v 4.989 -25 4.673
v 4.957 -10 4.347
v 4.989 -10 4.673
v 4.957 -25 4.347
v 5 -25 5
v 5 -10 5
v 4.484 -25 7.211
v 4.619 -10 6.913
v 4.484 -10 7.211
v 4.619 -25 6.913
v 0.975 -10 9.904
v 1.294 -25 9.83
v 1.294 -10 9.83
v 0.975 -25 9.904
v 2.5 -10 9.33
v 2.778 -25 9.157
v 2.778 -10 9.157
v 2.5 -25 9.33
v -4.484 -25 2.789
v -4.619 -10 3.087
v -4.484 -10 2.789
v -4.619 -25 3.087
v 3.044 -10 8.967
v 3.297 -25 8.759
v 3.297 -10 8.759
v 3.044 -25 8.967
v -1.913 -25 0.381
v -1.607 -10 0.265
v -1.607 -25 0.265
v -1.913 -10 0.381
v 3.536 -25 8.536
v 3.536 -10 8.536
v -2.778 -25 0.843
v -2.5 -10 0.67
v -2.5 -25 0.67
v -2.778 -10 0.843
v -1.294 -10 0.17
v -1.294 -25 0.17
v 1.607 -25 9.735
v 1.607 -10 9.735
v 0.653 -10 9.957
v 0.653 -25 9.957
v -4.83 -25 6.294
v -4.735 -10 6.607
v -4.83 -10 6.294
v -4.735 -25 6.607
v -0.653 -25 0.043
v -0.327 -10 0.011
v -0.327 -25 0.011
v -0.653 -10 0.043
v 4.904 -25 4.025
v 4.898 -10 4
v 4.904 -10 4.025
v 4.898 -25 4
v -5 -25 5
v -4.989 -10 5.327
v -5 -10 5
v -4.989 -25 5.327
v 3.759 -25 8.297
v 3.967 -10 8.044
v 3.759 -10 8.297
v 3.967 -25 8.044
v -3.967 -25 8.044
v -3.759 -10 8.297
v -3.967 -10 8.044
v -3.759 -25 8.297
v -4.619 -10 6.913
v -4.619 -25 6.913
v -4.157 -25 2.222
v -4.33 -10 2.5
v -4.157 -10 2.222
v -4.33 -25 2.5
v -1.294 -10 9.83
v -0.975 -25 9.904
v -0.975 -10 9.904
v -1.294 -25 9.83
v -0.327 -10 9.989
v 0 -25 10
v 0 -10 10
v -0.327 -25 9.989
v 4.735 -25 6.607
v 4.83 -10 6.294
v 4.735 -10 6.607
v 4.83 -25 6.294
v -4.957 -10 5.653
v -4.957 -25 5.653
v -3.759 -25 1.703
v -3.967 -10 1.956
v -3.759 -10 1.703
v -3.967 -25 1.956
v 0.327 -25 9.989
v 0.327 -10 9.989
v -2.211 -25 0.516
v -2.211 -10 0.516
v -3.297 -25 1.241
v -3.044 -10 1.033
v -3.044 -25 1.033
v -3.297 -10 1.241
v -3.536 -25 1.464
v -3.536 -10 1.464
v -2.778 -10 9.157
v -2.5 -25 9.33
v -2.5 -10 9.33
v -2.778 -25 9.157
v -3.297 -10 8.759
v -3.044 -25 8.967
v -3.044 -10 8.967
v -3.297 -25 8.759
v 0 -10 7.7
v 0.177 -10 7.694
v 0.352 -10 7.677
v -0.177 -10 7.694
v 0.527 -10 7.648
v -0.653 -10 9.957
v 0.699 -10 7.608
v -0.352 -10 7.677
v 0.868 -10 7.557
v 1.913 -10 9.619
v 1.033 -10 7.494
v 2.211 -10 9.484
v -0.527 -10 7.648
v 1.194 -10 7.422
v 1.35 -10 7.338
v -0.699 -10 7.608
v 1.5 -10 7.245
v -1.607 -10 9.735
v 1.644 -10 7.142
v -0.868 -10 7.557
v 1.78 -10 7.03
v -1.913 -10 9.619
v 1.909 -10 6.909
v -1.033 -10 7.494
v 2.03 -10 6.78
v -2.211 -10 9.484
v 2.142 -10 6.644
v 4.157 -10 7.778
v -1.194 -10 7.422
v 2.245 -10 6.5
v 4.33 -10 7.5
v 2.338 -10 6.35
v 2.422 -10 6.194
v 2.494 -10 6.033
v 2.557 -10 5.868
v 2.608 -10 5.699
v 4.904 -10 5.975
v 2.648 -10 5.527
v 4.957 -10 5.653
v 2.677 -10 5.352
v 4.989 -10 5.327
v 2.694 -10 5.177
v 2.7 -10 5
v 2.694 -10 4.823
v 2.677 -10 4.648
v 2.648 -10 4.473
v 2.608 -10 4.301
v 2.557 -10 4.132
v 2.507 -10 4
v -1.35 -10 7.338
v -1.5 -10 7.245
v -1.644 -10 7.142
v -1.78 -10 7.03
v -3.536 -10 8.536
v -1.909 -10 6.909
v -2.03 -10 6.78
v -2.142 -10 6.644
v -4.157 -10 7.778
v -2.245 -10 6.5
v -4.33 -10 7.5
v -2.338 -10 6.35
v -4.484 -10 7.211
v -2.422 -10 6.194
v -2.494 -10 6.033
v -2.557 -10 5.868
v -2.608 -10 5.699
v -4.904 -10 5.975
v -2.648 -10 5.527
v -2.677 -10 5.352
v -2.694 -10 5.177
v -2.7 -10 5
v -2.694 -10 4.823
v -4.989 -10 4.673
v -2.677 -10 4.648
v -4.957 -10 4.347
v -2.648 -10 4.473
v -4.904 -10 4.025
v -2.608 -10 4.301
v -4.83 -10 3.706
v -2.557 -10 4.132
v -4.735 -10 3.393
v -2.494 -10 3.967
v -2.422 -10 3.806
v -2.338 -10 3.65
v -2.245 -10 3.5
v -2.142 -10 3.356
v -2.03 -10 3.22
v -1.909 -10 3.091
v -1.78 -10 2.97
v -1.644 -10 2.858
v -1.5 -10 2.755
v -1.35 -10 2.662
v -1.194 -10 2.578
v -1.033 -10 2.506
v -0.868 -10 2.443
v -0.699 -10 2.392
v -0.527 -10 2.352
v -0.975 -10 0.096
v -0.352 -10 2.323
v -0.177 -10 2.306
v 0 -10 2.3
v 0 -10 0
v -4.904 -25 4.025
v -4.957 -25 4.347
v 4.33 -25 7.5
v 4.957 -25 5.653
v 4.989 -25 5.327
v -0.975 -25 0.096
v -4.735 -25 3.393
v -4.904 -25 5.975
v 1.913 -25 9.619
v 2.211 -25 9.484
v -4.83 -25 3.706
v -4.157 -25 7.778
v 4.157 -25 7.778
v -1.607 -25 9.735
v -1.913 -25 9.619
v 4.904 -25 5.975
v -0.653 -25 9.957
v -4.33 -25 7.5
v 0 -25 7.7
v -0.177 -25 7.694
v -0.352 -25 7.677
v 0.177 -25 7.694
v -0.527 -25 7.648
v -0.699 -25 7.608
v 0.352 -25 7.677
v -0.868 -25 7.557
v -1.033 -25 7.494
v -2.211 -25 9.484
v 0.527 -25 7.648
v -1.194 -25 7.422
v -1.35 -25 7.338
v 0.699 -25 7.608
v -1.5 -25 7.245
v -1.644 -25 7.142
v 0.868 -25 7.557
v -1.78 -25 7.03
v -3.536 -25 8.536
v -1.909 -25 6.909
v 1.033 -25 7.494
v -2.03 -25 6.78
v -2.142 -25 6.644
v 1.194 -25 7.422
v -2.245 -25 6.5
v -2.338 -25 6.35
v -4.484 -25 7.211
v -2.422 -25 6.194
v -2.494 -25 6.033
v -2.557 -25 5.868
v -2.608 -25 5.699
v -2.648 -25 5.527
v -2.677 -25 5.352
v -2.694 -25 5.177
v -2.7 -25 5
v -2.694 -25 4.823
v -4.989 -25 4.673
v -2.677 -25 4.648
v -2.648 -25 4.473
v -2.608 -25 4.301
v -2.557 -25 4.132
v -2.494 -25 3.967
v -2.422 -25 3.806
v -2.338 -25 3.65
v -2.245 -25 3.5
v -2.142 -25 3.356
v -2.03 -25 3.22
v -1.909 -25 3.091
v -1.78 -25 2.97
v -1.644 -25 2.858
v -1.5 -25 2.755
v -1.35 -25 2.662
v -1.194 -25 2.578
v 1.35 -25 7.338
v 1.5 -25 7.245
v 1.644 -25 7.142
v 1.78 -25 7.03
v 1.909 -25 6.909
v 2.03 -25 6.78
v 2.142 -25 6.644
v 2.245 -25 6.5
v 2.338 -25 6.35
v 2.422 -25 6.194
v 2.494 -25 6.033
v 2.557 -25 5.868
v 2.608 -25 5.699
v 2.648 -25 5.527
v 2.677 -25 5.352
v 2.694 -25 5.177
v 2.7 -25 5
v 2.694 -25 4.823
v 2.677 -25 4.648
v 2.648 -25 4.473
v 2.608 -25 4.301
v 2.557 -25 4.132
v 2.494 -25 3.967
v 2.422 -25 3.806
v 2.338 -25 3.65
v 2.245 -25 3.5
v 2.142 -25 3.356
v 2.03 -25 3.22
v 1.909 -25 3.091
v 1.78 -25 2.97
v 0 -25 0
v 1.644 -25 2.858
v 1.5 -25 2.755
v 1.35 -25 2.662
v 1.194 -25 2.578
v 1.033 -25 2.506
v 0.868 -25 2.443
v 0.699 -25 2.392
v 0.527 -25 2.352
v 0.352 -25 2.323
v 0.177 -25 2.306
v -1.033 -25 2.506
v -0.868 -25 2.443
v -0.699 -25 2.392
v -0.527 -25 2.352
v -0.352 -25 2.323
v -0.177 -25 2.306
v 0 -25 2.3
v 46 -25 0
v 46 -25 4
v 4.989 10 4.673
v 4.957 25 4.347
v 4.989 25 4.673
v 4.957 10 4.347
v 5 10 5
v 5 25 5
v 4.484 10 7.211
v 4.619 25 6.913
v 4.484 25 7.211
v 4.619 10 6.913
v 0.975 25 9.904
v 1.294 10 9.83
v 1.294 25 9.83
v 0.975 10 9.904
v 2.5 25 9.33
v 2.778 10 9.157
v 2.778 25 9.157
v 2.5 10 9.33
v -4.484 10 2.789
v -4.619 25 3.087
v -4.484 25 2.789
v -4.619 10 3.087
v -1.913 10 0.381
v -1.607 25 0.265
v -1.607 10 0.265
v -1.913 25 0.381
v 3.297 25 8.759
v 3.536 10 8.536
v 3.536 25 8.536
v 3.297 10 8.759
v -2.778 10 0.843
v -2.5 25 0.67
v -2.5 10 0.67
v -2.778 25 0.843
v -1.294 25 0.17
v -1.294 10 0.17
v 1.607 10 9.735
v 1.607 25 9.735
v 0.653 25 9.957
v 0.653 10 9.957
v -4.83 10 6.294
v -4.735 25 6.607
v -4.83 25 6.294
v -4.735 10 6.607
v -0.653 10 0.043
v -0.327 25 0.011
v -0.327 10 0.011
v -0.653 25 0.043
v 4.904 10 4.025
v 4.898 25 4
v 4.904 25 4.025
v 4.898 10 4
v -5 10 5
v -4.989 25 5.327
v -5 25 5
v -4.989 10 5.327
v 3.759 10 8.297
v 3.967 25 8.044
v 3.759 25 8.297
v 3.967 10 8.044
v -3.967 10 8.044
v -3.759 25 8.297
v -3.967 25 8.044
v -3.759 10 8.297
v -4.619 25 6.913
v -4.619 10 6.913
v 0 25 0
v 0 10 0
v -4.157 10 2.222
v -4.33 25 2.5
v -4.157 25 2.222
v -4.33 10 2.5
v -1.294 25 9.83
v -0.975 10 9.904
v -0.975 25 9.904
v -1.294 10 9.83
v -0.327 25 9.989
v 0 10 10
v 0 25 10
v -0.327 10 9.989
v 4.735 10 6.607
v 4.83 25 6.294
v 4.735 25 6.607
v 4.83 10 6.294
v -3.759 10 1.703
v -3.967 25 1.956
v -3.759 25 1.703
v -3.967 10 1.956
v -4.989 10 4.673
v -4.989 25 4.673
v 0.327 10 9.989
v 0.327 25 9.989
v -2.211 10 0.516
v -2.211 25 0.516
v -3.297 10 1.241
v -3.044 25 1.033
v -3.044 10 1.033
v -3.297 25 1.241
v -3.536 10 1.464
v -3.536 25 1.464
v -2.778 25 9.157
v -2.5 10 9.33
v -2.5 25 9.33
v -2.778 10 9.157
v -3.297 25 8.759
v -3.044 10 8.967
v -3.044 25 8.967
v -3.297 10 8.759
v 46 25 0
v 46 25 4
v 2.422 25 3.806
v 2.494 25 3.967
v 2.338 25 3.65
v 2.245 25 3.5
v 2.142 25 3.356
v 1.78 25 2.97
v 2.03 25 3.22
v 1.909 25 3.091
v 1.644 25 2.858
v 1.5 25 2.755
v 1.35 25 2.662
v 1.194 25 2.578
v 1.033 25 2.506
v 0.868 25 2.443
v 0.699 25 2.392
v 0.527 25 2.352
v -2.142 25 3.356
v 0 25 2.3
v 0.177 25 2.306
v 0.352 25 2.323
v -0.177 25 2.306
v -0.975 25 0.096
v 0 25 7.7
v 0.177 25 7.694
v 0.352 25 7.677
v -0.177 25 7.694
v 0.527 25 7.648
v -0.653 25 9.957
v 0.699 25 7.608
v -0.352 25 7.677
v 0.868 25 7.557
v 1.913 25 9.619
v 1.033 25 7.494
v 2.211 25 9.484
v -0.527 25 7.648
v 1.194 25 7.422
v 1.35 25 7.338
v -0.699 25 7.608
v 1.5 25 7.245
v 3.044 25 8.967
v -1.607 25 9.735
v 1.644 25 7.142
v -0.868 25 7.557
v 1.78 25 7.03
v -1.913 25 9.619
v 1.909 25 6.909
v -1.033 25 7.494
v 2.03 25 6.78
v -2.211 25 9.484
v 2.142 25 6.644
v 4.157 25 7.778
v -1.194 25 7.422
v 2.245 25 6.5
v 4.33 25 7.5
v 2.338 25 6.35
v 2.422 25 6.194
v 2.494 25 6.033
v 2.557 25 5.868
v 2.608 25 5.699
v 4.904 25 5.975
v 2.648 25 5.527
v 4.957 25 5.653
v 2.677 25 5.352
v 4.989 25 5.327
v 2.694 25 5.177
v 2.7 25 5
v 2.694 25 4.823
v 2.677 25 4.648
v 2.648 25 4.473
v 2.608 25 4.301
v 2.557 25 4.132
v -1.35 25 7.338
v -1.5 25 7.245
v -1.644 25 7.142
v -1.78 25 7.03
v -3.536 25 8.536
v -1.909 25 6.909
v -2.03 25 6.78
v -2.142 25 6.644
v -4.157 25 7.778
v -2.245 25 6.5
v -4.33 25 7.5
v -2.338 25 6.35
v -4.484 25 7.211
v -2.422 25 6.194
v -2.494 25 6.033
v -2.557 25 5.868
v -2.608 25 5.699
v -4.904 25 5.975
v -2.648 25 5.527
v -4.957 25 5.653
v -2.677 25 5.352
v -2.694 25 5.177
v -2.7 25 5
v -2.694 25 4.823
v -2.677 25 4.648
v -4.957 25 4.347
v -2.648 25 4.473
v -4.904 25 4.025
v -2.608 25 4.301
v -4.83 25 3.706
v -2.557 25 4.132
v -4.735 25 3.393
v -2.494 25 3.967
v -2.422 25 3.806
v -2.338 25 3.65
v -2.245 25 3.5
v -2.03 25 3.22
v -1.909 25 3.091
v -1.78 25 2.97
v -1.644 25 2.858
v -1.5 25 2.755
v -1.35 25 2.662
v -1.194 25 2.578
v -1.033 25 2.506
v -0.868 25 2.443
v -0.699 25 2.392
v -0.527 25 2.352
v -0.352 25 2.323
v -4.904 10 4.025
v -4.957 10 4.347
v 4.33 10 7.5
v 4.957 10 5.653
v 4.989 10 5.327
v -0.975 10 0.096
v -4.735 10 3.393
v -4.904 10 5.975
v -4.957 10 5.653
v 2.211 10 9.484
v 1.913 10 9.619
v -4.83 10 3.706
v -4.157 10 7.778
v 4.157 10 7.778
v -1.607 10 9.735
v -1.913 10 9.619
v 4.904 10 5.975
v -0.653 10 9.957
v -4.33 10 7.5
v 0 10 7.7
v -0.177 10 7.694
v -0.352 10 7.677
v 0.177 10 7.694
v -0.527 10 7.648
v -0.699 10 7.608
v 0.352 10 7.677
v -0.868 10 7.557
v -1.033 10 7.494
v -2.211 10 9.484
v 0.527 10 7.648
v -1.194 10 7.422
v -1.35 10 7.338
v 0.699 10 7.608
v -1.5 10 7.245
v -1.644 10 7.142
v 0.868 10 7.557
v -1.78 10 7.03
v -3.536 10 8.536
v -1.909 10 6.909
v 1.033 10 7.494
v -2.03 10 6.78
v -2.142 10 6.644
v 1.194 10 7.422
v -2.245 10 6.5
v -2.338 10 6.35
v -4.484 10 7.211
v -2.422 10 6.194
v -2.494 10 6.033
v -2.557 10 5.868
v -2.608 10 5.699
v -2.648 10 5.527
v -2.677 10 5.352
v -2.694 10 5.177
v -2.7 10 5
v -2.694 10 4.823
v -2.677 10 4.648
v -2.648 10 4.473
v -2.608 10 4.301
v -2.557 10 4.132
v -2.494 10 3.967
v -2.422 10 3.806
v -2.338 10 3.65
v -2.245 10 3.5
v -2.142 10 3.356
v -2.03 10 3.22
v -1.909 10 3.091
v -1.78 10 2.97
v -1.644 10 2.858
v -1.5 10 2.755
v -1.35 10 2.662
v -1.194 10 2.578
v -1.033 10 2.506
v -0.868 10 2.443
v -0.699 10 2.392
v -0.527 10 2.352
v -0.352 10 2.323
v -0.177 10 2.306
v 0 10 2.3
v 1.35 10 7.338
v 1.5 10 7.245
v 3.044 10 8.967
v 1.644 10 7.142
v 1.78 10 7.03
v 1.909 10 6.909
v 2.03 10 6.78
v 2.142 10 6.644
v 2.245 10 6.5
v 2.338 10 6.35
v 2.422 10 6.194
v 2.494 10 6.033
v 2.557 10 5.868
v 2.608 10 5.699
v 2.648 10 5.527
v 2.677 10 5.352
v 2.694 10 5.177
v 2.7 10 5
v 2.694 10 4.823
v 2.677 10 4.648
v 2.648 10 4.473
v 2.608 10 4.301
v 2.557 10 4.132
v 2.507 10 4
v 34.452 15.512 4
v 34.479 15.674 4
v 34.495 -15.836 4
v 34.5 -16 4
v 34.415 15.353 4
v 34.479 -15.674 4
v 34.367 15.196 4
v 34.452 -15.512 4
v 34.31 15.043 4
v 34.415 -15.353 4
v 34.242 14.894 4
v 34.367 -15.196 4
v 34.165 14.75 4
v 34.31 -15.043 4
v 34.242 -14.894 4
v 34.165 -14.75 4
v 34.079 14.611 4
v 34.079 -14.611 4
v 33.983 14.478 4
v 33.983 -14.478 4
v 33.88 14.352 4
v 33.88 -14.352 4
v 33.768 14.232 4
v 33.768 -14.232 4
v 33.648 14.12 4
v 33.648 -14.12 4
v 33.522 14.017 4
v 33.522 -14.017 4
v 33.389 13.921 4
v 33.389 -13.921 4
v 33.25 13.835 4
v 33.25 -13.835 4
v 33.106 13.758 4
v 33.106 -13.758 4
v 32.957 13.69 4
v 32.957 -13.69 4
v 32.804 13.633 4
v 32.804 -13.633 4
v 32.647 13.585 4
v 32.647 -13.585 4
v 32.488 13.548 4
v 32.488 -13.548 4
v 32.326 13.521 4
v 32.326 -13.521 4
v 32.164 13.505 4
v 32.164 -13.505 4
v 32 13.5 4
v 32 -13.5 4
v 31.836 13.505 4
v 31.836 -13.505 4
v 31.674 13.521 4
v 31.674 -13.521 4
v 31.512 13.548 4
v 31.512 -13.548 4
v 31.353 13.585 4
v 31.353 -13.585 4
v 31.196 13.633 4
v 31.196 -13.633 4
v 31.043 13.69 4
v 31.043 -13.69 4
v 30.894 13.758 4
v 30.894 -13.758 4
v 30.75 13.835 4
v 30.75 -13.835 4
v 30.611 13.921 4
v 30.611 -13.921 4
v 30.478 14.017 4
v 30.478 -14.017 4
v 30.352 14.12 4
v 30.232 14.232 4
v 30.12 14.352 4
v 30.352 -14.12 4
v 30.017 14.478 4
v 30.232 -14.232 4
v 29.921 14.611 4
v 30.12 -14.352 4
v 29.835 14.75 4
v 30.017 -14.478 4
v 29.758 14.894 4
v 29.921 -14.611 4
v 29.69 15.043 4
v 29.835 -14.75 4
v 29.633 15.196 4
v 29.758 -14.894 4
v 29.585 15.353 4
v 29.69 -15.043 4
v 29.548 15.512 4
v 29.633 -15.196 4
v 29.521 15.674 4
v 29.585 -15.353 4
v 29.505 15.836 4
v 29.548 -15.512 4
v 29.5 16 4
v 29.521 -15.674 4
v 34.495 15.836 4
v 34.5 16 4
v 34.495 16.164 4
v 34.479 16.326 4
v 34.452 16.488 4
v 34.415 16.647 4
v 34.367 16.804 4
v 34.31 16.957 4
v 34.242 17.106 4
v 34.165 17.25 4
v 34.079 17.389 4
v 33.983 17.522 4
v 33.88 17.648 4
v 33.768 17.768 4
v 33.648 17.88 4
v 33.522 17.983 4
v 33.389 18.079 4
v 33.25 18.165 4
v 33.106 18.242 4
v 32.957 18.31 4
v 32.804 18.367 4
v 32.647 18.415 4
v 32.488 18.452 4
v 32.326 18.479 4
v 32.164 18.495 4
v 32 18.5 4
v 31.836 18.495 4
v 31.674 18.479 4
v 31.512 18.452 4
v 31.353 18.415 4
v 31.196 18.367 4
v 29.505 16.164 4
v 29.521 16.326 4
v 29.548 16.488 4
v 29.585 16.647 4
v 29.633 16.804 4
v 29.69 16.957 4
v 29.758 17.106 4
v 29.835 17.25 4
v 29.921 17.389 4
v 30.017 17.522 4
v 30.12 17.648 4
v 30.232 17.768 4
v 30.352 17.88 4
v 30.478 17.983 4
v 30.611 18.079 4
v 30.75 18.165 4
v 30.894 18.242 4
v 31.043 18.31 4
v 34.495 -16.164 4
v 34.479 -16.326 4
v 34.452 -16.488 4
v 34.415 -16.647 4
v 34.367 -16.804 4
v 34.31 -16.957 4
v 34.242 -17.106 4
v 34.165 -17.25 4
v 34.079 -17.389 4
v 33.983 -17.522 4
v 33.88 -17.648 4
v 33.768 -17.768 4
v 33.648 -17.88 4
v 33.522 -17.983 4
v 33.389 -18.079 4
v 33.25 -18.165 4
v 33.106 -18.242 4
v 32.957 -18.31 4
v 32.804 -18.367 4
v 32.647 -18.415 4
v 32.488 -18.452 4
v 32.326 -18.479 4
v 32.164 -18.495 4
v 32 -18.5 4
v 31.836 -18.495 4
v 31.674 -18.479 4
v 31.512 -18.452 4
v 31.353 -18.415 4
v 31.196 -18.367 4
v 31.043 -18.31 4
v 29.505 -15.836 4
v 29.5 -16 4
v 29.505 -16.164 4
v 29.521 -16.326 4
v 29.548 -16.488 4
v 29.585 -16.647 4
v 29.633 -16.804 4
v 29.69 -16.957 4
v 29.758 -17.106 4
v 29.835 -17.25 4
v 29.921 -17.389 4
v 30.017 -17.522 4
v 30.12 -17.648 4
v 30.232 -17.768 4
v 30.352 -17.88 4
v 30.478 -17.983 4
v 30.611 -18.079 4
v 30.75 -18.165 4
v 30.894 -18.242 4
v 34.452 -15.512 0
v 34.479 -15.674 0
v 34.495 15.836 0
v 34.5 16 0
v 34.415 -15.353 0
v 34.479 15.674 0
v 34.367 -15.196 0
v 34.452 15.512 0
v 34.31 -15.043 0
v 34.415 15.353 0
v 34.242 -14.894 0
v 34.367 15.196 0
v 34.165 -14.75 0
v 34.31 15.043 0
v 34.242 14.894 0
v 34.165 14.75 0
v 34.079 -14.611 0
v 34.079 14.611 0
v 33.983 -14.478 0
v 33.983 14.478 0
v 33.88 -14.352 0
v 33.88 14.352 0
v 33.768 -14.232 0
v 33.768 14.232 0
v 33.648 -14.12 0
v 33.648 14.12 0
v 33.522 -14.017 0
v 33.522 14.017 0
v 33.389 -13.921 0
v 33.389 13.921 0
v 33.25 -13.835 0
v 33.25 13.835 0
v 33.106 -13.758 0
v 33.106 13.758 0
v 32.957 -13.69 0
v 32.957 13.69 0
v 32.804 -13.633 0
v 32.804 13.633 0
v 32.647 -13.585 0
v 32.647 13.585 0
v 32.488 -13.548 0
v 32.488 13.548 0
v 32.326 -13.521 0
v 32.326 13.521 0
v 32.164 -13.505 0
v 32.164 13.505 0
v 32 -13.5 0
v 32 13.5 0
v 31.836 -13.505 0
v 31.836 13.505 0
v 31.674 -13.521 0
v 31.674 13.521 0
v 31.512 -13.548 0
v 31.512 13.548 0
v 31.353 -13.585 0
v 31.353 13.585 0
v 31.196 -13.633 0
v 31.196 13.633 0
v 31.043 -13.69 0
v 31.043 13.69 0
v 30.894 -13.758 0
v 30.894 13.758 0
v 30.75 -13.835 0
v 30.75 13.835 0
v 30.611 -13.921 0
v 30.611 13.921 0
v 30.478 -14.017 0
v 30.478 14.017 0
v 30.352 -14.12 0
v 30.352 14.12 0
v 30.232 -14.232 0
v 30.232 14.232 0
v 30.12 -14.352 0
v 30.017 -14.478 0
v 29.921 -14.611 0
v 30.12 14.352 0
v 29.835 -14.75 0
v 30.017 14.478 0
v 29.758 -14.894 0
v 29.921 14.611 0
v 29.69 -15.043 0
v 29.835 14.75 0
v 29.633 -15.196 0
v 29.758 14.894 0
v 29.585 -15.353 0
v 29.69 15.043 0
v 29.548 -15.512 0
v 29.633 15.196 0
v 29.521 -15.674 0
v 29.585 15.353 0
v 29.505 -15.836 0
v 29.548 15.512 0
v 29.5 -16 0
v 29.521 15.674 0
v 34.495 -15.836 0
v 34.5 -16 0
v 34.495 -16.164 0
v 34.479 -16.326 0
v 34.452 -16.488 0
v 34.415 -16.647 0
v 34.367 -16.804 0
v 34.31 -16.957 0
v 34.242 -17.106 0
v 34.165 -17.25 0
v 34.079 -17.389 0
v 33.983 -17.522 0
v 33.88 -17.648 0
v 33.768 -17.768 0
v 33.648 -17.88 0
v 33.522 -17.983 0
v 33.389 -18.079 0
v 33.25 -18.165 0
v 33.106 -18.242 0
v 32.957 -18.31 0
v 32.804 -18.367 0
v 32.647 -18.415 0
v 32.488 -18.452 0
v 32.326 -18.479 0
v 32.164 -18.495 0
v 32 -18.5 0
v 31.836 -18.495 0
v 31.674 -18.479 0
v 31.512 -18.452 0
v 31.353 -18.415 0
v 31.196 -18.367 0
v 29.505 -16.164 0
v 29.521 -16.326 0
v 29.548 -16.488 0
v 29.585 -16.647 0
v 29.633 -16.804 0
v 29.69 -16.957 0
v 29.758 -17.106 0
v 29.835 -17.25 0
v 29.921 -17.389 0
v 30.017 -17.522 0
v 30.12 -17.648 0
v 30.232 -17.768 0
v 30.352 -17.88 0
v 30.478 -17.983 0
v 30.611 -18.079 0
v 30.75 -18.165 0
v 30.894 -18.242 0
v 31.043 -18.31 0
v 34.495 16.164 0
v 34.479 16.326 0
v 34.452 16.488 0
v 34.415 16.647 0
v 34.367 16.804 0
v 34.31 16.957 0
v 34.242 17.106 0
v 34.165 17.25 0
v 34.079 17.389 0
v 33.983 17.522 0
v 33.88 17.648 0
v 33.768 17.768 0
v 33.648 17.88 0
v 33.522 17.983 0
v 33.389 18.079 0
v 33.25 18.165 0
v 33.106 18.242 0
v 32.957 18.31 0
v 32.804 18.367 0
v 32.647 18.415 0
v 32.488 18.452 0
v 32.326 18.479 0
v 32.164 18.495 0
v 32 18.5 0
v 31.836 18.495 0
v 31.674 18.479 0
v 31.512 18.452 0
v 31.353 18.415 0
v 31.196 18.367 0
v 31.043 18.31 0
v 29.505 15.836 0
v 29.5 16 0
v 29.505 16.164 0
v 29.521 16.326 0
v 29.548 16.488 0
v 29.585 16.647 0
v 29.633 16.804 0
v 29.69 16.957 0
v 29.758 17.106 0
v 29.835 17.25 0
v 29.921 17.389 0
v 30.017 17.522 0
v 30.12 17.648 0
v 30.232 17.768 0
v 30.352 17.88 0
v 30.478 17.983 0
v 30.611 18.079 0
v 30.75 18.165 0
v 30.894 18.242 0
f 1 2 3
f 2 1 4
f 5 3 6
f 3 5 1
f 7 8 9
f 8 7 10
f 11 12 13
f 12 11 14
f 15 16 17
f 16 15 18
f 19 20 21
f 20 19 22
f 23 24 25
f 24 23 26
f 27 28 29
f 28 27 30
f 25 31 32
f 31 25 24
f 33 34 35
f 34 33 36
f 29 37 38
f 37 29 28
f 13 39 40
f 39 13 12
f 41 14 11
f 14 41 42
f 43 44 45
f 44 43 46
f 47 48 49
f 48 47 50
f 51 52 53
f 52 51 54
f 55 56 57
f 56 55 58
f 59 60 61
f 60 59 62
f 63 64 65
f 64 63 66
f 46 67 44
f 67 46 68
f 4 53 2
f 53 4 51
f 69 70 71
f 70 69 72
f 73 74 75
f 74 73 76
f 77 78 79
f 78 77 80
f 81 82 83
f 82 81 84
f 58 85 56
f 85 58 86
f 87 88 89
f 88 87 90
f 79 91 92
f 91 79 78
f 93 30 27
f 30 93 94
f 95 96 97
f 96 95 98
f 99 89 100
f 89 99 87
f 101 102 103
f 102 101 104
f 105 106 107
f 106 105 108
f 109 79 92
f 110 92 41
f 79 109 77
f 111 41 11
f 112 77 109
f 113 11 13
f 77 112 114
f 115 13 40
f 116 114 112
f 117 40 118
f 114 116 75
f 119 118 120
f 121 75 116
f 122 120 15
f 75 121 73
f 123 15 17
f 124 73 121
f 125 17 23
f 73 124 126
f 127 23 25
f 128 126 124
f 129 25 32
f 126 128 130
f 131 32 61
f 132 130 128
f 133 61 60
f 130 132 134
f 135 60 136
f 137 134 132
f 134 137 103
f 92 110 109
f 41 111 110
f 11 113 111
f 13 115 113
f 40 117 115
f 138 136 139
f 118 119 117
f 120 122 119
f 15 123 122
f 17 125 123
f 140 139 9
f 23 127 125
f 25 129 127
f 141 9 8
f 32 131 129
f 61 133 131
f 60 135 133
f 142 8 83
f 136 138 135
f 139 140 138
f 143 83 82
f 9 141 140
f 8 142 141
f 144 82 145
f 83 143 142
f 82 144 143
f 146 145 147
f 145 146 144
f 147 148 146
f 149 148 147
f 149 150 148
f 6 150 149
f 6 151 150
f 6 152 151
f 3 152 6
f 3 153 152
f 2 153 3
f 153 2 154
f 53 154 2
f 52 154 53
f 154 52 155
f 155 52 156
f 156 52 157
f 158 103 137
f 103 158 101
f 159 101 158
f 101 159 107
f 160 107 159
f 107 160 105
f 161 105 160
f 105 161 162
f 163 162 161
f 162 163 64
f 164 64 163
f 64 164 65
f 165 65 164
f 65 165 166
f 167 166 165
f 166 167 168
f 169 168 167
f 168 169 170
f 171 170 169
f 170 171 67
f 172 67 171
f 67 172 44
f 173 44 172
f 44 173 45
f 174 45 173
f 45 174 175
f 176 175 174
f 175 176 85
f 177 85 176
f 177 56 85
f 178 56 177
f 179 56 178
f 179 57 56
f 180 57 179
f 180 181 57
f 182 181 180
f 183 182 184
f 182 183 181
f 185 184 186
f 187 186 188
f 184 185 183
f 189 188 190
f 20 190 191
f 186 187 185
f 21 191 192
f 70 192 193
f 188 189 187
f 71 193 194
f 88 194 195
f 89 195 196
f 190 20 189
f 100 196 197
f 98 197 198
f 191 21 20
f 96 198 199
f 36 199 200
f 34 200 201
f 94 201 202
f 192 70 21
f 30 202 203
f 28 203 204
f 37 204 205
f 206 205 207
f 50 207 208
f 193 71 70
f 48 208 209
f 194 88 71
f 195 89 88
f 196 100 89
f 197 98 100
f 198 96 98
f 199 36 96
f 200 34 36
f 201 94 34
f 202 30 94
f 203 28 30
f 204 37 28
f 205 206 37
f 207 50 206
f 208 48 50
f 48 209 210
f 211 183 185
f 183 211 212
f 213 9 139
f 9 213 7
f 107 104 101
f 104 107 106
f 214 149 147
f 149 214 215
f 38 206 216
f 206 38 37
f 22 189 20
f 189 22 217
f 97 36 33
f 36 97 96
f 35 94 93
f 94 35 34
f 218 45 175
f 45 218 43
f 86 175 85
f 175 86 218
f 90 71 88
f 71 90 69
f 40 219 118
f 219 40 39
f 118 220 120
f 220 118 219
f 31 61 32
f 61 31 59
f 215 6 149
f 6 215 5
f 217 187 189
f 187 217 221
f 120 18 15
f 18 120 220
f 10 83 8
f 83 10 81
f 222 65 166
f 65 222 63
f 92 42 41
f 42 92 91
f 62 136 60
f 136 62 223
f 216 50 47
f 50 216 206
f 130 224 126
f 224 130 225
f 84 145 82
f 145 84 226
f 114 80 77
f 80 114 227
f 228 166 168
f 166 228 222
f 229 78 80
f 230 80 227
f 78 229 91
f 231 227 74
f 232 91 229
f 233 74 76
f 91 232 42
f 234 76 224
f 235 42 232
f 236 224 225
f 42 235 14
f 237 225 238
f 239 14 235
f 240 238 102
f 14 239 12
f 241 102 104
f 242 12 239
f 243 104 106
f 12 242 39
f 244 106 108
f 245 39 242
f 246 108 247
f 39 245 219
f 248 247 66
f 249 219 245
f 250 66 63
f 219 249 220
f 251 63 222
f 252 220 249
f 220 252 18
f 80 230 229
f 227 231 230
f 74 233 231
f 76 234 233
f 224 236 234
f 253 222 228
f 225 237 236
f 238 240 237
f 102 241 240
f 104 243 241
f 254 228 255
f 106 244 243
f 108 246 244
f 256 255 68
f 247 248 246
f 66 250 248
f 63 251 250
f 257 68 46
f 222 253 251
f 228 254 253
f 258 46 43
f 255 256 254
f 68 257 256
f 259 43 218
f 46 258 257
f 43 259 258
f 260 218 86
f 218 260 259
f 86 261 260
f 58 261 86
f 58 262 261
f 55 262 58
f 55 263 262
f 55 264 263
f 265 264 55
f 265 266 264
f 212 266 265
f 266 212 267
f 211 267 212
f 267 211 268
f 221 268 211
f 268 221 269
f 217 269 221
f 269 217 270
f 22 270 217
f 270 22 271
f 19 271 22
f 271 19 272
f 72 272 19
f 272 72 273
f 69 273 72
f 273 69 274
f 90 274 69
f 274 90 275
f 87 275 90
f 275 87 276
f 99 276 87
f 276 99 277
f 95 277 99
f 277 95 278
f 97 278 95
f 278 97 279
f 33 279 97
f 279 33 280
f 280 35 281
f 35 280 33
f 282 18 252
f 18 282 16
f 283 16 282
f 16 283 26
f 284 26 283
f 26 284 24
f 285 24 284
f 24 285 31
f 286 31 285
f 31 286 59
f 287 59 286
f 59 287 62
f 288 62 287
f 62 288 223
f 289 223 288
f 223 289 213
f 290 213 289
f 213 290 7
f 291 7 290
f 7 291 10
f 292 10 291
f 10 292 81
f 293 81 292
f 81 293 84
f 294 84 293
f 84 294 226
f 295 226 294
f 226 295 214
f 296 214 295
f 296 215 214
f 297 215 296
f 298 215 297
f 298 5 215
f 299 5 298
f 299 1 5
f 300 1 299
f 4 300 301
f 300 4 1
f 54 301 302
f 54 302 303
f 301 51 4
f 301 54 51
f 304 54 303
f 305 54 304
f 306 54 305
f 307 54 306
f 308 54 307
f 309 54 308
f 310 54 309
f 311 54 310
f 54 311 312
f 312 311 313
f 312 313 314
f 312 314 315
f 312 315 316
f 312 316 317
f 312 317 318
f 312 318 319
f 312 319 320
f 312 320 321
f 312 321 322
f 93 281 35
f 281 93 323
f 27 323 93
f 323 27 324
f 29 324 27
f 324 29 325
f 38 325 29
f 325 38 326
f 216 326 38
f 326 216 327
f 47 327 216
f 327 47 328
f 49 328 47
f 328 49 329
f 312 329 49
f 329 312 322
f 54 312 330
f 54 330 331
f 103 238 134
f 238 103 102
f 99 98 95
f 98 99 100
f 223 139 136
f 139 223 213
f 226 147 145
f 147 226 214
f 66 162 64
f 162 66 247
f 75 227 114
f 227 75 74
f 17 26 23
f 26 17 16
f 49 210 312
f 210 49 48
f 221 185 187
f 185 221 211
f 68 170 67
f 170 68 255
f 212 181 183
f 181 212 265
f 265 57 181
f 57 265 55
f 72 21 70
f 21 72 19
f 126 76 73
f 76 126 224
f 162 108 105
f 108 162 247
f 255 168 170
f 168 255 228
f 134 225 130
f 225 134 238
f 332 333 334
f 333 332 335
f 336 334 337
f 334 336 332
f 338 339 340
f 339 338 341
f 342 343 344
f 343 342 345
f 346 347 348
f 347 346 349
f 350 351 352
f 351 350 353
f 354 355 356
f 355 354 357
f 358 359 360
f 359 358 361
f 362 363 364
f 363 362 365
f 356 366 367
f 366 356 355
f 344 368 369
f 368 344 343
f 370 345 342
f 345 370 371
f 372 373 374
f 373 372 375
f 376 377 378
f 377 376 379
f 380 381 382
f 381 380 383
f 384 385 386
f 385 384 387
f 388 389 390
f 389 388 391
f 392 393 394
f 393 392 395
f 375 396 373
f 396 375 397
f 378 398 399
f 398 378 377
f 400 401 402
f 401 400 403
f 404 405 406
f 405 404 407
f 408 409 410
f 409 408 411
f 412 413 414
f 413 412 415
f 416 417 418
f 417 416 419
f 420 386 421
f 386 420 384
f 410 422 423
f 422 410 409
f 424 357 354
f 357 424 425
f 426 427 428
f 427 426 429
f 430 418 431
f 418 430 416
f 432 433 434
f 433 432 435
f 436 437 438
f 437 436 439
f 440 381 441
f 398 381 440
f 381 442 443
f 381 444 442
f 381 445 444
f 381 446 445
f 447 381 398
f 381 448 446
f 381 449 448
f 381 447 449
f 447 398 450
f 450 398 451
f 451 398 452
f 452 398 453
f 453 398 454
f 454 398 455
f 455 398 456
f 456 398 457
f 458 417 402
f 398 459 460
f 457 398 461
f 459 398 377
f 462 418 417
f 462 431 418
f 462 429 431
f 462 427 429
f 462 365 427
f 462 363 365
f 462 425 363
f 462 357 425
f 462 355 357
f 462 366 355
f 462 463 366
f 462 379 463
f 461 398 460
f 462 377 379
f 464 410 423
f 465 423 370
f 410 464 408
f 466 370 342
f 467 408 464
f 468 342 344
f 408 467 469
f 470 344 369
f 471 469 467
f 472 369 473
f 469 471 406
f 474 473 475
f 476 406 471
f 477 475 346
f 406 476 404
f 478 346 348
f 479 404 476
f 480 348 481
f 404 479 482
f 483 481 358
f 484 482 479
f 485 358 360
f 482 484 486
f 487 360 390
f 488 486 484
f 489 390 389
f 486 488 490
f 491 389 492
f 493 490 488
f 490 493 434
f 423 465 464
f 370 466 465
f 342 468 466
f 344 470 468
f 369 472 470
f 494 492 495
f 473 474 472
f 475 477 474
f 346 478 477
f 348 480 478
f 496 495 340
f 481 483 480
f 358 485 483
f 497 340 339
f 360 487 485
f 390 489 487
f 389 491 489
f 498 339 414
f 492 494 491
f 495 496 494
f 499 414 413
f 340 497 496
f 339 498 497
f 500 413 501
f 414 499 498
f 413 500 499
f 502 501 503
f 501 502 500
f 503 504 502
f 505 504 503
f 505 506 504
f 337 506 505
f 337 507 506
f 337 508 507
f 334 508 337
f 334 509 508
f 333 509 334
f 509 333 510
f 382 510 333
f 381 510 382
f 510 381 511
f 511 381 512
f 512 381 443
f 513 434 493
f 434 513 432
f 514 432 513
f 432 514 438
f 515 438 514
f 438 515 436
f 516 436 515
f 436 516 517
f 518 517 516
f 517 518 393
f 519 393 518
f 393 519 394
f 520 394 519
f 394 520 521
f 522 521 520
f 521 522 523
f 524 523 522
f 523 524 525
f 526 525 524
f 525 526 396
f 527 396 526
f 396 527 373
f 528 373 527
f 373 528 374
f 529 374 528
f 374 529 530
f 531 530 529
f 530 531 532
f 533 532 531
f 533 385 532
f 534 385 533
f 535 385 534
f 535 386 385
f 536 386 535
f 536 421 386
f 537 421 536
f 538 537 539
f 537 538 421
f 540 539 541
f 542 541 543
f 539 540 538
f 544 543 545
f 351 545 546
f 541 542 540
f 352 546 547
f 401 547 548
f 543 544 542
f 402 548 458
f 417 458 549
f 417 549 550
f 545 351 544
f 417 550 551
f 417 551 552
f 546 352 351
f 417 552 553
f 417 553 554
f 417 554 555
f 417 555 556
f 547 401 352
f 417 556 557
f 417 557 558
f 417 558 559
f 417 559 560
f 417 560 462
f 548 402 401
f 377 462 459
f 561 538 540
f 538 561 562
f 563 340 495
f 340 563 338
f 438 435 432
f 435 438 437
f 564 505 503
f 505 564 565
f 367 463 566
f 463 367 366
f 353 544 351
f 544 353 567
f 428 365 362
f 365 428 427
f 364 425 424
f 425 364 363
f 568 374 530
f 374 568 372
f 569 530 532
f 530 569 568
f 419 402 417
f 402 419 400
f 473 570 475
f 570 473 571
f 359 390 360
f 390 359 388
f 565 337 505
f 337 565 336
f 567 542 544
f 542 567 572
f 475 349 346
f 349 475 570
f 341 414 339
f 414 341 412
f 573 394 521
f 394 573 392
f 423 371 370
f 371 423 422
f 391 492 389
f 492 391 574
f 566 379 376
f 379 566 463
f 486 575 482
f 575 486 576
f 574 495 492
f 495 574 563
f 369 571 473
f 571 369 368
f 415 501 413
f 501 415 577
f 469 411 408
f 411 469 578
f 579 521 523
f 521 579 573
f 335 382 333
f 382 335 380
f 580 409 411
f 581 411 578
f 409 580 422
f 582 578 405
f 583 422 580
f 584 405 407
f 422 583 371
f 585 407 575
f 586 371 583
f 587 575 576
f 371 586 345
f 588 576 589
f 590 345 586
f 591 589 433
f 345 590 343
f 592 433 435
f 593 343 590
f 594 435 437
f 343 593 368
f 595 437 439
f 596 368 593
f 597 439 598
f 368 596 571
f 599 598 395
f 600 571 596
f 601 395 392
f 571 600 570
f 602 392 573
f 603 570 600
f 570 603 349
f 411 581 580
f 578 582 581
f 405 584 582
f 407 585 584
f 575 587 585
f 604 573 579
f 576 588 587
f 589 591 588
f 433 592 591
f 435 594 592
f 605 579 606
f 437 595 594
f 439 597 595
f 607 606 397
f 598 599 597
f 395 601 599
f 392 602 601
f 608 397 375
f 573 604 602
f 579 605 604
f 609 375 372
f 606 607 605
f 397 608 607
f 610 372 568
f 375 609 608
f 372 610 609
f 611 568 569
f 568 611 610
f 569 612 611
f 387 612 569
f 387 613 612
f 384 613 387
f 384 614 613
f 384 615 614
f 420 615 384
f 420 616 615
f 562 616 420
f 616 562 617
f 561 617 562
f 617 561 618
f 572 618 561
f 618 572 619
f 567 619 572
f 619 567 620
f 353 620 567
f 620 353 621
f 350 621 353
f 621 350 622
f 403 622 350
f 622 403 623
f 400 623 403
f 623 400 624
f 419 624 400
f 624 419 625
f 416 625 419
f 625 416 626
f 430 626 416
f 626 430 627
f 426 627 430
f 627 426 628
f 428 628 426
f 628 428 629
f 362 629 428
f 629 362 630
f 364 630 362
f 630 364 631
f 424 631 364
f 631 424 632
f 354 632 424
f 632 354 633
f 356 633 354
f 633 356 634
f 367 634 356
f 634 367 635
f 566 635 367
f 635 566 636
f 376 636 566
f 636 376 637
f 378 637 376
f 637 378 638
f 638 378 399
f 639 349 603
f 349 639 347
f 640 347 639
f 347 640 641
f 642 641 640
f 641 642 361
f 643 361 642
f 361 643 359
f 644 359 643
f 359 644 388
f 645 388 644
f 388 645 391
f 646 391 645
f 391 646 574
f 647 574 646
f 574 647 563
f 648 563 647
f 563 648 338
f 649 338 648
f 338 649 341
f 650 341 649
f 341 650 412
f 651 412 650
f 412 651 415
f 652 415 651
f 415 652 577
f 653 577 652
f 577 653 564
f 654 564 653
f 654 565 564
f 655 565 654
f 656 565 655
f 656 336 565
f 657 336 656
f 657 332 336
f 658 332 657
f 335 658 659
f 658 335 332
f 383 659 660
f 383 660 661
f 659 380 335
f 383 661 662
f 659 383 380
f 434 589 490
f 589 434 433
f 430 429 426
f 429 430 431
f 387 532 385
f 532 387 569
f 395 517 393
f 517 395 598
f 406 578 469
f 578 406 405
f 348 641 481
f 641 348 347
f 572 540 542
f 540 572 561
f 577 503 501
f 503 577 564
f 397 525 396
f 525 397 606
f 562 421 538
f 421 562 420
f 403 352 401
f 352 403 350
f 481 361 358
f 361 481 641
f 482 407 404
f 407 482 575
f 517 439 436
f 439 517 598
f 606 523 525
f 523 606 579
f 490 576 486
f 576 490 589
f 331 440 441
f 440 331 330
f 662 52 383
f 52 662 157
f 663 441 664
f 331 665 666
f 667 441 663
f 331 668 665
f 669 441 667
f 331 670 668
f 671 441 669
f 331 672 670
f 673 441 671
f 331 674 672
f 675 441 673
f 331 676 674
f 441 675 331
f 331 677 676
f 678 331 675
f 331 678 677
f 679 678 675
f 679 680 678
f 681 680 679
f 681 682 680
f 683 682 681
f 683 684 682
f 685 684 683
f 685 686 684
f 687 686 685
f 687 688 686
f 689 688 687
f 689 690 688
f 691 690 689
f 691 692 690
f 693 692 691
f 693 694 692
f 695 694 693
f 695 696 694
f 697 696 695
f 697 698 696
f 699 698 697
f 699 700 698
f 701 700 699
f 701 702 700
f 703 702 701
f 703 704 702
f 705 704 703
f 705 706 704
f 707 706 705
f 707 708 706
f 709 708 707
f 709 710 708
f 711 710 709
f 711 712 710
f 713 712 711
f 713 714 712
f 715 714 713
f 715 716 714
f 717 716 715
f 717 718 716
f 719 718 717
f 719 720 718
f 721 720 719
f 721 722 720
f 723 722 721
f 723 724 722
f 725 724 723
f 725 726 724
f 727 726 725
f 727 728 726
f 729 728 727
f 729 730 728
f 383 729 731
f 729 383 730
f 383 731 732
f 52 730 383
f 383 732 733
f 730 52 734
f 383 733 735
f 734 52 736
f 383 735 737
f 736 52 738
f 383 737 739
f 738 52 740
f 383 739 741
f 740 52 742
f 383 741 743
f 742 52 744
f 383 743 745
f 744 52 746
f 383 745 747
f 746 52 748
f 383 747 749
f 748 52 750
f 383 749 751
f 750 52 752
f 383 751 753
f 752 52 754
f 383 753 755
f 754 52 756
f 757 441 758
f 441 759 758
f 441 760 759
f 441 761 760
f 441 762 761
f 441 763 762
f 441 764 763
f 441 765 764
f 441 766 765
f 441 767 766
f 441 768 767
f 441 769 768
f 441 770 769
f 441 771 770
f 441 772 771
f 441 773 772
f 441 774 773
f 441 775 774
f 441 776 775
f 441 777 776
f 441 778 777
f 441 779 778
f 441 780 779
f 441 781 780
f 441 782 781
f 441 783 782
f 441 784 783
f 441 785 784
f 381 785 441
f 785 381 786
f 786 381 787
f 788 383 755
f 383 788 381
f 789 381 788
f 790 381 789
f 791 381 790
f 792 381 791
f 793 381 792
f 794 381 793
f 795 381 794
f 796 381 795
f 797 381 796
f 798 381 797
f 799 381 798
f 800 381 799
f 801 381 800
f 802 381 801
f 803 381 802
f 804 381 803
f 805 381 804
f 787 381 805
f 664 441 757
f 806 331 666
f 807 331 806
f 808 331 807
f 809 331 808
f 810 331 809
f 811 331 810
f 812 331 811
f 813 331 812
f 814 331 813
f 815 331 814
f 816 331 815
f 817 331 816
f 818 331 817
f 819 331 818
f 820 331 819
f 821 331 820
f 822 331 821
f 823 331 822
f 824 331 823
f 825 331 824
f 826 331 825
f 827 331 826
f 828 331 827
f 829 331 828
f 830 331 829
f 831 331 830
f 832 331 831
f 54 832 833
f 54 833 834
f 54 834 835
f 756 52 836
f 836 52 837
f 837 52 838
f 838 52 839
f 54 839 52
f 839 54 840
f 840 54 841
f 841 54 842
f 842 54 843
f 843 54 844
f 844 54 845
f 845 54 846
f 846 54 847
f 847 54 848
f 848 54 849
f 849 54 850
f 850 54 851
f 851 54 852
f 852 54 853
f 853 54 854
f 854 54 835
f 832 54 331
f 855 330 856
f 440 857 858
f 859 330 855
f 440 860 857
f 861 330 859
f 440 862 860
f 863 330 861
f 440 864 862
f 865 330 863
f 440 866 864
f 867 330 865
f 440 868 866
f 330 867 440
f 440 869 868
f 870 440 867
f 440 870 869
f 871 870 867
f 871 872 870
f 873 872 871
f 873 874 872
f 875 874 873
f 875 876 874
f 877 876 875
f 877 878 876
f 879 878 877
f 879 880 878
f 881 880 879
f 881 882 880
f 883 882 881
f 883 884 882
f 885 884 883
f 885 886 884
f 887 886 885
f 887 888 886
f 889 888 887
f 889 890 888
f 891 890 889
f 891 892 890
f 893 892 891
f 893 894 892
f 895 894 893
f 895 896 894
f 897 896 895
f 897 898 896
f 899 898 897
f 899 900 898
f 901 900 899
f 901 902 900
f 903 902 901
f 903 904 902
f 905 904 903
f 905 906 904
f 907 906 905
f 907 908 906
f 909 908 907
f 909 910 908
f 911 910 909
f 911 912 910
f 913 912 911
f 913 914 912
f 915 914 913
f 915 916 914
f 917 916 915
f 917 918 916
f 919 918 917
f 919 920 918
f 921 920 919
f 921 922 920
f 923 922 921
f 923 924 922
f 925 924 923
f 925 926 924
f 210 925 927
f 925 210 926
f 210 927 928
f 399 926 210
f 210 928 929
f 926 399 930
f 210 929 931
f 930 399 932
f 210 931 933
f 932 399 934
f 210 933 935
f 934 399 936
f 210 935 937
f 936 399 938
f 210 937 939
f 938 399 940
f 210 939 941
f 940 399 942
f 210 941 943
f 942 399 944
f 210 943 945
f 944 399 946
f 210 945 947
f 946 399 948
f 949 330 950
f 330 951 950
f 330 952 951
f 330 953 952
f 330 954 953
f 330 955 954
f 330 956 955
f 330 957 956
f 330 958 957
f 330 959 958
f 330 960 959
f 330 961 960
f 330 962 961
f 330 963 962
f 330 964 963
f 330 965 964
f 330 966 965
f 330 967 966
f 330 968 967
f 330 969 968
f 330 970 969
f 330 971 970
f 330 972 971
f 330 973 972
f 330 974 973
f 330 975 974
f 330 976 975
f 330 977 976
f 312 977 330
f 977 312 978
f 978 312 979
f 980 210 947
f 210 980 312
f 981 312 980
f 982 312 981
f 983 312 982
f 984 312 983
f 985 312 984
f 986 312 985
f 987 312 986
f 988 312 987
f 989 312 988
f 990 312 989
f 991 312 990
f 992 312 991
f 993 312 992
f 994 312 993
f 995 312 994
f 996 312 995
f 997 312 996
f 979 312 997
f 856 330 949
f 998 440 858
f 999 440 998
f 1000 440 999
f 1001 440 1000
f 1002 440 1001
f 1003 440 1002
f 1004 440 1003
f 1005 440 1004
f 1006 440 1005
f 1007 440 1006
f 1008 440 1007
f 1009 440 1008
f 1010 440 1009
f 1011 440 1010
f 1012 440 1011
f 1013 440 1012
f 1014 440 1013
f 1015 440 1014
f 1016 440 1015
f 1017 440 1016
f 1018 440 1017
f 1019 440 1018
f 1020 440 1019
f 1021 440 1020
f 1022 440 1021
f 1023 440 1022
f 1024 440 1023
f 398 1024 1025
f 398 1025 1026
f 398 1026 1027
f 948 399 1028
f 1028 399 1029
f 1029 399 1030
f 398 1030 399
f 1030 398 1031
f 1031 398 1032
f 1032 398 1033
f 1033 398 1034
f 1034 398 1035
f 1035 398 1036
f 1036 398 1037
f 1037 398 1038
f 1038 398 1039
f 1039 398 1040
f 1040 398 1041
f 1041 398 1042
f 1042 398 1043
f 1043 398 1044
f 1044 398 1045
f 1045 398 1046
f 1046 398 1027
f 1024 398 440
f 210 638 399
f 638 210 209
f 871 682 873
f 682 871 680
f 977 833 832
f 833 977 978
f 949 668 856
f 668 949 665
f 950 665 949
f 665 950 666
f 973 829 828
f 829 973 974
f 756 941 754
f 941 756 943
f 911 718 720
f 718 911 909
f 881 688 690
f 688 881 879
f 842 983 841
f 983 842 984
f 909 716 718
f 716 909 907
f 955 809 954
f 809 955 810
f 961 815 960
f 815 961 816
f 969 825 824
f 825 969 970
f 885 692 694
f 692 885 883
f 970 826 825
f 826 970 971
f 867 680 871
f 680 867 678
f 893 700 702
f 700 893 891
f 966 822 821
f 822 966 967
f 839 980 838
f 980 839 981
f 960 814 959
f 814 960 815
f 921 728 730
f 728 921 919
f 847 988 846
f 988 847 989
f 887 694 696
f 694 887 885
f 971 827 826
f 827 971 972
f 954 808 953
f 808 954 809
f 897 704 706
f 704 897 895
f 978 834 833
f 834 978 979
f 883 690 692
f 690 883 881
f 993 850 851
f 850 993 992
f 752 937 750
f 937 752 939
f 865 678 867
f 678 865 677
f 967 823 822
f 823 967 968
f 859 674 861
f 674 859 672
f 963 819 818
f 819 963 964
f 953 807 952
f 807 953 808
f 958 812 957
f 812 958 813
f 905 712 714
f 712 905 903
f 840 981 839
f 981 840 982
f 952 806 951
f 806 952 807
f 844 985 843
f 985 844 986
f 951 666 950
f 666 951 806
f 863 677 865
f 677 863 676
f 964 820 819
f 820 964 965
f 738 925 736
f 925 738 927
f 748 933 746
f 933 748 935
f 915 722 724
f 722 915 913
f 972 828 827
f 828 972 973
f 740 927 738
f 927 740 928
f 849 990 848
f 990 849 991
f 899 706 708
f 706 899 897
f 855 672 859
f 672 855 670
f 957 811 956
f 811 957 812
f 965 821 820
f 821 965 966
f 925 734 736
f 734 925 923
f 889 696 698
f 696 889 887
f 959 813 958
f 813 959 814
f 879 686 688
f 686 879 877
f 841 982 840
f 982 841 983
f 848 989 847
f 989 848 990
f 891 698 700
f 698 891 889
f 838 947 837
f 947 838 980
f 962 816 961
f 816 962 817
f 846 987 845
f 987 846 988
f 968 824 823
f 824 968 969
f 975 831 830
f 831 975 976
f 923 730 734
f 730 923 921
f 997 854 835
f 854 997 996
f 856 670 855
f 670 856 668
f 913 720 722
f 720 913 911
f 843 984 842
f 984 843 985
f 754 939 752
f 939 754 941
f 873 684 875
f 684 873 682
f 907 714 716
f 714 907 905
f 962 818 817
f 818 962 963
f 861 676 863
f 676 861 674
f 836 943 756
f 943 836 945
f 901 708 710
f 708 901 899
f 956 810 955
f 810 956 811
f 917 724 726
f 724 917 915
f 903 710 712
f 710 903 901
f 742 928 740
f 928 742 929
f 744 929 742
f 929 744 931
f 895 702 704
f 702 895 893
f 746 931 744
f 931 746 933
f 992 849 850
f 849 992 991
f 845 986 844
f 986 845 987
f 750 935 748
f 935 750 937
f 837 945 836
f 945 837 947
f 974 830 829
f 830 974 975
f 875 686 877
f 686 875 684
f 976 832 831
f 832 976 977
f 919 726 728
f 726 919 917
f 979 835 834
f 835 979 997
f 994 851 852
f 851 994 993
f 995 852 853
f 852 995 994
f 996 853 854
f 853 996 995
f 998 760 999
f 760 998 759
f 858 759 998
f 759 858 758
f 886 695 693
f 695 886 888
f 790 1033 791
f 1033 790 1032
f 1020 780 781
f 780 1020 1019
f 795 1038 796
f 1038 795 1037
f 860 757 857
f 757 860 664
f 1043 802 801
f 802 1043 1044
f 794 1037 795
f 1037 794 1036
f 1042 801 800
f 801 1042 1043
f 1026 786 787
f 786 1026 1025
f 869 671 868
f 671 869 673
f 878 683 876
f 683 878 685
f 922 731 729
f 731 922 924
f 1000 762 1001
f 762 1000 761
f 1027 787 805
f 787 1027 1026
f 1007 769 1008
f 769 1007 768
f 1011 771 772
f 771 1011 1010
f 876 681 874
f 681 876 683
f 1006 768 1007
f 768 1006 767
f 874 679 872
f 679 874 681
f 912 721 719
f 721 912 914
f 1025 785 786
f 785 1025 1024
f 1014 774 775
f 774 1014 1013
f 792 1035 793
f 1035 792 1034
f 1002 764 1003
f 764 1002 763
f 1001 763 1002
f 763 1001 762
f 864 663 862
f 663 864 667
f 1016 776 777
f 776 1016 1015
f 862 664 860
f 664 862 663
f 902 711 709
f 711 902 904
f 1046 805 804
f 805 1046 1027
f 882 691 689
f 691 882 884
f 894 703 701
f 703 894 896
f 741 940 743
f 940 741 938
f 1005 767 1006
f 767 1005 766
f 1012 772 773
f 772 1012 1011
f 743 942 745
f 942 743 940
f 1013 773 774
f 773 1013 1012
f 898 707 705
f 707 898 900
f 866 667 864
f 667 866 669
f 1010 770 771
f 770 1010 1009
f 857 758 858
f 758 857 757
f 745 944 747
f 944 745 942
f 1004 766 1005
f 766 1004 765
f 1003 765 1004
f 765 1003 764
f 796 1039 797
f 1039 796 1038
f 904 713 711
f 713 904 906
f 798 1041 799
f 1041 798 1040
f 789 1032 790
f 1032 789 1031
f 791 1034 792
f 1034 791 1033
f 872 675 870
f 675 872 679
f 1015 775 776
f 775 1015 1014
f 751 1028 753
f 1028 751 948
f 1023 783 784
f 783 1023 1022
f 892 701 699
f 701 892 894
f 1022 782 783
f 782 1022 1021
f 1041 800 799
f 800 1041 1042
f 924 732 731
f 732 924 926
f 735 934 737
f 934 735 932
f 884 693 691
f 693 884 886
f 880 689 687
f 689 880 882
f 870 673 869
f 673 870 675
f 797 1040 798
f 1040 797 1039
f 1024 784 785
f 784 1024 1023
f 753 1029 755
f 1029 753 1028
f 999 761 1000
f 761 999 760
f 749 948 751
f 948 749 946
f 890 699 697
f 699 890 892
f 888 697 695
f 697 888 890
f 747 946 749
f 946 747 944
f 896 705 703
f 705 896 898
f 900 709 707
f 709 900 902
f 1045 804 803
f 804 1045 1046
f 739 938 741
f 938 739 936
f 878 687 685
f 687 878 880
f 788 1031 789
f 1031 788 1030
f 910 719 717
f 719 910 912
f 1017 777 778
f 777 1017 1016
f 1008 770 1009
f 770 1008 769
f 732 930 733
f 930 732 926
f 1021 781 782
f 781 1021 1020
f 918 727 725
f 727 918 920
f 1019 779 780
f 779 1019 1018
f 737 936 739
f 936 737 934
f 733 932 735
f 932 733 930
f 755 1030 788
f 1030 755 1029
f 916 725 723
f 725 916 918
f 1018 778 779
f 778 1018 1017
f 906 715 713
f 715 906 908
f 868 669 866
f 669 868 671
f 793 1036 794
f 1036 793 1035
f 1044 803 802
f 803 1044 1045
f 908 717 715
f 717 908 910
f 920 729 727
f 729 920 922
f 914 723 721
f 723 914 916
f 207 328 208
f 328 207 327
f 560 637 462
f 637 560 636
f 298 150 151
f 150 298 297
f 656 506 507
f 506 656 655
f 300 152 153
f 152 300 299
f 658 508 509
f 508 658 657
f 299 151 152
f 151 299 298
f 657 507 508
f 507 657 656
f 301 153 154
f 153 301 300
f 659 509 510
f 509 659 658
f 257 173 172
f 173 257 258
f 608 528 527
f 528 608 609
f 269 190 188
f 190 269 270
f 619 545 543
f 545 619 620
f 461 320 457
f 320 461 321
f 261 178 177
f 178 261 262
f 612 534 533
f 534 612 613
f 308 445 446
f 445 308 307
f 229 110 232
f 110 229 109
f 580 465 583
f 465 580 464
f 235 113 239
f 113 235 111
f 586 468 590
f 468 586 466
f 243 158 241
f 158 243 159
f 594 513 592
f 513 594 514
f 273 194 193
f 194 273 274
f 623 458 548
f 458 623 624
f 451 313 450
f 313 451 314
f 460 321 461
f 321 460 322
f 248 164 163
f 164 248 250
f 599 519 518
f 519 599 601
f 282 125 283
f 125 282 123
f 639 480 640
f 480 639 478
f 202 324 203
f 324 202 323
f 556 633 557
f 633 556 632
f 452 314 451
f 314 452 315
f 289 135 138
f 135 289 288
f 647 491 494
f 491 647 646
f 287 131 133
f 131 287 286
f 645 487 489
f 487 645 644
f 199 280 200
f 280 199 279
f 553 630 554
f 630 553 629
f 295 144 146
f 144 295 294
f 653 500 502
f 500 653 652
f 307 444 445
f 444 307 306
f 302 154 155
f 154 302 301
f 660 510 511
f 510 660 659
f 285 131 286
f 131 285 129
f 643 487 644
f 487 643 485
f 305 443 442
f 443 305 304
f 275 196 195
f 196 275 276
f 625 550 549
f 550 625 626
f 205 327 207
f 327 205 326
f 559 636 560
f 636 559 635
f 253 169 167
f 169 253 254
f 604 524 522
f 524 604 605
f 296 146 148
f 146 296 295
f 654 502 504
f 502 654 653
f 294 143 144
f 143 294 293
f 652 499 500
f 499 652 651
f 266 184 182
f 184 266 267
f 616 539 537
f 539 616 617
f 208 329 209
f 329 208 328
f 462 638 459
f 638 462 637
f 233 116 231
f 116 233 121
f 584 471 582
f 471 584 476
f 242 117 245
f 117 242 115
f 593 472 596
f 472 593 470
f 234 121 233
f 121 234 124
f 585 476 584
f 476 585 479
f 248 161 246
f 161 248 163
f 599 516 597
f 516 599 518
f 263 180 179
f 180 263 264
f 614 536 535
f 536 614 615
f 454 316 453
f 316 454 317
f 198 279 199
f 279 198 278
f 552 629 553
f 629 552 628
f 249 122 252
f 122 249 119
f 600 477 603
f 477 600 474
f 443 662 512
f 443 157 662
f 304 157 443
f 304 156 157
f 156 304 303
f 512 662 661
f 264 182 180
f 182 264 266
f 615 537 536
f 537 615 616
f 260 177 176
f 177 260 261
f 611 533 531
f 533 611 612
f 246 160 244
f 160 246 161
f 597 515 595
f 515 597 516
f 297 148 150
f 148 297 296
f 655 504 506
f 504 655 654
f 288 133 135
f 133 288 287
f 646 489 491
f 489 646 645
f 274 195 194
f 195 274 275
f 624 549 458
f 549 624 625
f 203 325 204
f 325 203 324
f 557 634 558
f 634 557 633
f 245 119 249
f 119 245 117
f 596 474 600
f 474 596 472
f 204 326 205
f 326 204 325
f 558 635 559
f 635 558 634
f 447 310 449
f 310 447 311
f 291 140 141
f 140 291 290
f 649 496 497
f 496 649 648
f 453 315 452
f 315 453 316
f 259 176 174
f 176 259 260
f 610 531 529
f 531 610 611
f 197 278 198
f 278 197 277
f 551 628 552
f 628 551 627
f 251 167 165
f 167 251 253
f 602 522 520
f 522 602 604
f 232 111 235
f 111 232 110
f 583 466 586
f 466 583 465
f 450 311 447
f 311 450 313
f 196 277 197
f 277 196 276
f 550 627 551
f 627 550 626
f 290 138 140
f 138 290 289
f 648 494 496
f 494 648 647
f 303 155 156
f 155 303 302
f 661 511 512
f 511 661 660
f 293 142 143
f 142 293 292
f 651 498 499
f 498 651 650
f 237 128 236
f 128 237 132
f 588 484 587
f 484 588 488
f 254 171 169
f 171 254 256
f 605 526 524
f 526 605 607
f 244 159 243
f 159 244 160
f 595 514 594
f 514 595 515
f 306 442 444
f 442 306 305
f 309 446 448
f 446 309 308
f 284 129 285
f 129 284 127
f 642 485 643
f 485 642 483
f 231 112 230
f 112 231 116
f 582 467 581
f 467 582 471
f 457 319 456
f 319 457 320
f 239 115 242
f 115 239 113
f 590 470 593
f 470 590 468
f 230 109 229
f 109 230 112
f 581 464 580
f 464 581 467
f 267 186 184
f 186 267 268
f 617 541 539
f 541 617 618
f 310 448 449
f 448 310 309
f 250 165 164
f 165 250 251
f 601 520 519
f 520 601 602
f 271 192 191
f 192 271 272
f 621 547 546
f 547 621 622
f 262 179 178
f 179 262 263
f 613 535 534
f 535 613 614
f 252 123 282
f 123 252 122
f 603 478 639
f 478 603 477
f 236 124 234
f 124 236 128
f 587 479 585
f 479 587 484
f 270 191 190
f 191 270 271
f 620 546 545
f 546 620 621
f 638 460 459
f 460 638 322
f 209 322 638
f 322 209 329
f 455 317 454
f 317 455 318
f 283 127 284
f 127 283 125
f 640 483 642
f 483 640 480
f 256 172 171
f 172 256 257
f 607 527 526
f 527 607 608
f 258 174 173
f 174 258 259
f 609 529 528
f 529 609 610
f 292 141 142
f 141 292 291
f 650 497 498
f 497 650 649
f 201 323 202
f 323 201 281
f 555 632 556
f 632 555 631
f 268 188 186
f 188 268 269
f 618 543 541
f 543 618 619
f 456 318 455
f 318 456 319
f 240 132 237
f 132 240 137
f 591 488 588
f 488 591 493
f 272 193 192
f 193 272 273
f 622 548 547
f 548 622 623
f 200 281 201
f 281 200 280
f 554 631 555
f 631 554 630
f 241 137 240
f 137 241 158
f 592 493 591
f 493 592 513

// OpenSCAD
// t4-008 hinge leaf with pin bore
pin_diameter = 5;
pin_clearance = 0.4;
knuckle_diameter = 10;
leaf = [46, 50, 4];
fix_d = 5;
$fn = 96;

kr = knuckle_diameter / 2;
bore = pin_diameter + pin_clearance;
difference() {
    union() {
        translate([0, -leaf.y/2, 0]) cube(leaf);
        for (y0 = [-25, 10]) translate([0, y0, kr]) rotate([-90, 0, 0])
            cylinder(r = kr, h = 15);
    }
    translate([0, -leaf.y/2 - 1, kr]) rotate([-90, 0, 0]) cylinder(d = bore, h = leaf.y + 2);
    for (y = [-16, 16]) translate([32, y, -1]) cylinder(d = fix_d, h = leaf.z + 2);
}
